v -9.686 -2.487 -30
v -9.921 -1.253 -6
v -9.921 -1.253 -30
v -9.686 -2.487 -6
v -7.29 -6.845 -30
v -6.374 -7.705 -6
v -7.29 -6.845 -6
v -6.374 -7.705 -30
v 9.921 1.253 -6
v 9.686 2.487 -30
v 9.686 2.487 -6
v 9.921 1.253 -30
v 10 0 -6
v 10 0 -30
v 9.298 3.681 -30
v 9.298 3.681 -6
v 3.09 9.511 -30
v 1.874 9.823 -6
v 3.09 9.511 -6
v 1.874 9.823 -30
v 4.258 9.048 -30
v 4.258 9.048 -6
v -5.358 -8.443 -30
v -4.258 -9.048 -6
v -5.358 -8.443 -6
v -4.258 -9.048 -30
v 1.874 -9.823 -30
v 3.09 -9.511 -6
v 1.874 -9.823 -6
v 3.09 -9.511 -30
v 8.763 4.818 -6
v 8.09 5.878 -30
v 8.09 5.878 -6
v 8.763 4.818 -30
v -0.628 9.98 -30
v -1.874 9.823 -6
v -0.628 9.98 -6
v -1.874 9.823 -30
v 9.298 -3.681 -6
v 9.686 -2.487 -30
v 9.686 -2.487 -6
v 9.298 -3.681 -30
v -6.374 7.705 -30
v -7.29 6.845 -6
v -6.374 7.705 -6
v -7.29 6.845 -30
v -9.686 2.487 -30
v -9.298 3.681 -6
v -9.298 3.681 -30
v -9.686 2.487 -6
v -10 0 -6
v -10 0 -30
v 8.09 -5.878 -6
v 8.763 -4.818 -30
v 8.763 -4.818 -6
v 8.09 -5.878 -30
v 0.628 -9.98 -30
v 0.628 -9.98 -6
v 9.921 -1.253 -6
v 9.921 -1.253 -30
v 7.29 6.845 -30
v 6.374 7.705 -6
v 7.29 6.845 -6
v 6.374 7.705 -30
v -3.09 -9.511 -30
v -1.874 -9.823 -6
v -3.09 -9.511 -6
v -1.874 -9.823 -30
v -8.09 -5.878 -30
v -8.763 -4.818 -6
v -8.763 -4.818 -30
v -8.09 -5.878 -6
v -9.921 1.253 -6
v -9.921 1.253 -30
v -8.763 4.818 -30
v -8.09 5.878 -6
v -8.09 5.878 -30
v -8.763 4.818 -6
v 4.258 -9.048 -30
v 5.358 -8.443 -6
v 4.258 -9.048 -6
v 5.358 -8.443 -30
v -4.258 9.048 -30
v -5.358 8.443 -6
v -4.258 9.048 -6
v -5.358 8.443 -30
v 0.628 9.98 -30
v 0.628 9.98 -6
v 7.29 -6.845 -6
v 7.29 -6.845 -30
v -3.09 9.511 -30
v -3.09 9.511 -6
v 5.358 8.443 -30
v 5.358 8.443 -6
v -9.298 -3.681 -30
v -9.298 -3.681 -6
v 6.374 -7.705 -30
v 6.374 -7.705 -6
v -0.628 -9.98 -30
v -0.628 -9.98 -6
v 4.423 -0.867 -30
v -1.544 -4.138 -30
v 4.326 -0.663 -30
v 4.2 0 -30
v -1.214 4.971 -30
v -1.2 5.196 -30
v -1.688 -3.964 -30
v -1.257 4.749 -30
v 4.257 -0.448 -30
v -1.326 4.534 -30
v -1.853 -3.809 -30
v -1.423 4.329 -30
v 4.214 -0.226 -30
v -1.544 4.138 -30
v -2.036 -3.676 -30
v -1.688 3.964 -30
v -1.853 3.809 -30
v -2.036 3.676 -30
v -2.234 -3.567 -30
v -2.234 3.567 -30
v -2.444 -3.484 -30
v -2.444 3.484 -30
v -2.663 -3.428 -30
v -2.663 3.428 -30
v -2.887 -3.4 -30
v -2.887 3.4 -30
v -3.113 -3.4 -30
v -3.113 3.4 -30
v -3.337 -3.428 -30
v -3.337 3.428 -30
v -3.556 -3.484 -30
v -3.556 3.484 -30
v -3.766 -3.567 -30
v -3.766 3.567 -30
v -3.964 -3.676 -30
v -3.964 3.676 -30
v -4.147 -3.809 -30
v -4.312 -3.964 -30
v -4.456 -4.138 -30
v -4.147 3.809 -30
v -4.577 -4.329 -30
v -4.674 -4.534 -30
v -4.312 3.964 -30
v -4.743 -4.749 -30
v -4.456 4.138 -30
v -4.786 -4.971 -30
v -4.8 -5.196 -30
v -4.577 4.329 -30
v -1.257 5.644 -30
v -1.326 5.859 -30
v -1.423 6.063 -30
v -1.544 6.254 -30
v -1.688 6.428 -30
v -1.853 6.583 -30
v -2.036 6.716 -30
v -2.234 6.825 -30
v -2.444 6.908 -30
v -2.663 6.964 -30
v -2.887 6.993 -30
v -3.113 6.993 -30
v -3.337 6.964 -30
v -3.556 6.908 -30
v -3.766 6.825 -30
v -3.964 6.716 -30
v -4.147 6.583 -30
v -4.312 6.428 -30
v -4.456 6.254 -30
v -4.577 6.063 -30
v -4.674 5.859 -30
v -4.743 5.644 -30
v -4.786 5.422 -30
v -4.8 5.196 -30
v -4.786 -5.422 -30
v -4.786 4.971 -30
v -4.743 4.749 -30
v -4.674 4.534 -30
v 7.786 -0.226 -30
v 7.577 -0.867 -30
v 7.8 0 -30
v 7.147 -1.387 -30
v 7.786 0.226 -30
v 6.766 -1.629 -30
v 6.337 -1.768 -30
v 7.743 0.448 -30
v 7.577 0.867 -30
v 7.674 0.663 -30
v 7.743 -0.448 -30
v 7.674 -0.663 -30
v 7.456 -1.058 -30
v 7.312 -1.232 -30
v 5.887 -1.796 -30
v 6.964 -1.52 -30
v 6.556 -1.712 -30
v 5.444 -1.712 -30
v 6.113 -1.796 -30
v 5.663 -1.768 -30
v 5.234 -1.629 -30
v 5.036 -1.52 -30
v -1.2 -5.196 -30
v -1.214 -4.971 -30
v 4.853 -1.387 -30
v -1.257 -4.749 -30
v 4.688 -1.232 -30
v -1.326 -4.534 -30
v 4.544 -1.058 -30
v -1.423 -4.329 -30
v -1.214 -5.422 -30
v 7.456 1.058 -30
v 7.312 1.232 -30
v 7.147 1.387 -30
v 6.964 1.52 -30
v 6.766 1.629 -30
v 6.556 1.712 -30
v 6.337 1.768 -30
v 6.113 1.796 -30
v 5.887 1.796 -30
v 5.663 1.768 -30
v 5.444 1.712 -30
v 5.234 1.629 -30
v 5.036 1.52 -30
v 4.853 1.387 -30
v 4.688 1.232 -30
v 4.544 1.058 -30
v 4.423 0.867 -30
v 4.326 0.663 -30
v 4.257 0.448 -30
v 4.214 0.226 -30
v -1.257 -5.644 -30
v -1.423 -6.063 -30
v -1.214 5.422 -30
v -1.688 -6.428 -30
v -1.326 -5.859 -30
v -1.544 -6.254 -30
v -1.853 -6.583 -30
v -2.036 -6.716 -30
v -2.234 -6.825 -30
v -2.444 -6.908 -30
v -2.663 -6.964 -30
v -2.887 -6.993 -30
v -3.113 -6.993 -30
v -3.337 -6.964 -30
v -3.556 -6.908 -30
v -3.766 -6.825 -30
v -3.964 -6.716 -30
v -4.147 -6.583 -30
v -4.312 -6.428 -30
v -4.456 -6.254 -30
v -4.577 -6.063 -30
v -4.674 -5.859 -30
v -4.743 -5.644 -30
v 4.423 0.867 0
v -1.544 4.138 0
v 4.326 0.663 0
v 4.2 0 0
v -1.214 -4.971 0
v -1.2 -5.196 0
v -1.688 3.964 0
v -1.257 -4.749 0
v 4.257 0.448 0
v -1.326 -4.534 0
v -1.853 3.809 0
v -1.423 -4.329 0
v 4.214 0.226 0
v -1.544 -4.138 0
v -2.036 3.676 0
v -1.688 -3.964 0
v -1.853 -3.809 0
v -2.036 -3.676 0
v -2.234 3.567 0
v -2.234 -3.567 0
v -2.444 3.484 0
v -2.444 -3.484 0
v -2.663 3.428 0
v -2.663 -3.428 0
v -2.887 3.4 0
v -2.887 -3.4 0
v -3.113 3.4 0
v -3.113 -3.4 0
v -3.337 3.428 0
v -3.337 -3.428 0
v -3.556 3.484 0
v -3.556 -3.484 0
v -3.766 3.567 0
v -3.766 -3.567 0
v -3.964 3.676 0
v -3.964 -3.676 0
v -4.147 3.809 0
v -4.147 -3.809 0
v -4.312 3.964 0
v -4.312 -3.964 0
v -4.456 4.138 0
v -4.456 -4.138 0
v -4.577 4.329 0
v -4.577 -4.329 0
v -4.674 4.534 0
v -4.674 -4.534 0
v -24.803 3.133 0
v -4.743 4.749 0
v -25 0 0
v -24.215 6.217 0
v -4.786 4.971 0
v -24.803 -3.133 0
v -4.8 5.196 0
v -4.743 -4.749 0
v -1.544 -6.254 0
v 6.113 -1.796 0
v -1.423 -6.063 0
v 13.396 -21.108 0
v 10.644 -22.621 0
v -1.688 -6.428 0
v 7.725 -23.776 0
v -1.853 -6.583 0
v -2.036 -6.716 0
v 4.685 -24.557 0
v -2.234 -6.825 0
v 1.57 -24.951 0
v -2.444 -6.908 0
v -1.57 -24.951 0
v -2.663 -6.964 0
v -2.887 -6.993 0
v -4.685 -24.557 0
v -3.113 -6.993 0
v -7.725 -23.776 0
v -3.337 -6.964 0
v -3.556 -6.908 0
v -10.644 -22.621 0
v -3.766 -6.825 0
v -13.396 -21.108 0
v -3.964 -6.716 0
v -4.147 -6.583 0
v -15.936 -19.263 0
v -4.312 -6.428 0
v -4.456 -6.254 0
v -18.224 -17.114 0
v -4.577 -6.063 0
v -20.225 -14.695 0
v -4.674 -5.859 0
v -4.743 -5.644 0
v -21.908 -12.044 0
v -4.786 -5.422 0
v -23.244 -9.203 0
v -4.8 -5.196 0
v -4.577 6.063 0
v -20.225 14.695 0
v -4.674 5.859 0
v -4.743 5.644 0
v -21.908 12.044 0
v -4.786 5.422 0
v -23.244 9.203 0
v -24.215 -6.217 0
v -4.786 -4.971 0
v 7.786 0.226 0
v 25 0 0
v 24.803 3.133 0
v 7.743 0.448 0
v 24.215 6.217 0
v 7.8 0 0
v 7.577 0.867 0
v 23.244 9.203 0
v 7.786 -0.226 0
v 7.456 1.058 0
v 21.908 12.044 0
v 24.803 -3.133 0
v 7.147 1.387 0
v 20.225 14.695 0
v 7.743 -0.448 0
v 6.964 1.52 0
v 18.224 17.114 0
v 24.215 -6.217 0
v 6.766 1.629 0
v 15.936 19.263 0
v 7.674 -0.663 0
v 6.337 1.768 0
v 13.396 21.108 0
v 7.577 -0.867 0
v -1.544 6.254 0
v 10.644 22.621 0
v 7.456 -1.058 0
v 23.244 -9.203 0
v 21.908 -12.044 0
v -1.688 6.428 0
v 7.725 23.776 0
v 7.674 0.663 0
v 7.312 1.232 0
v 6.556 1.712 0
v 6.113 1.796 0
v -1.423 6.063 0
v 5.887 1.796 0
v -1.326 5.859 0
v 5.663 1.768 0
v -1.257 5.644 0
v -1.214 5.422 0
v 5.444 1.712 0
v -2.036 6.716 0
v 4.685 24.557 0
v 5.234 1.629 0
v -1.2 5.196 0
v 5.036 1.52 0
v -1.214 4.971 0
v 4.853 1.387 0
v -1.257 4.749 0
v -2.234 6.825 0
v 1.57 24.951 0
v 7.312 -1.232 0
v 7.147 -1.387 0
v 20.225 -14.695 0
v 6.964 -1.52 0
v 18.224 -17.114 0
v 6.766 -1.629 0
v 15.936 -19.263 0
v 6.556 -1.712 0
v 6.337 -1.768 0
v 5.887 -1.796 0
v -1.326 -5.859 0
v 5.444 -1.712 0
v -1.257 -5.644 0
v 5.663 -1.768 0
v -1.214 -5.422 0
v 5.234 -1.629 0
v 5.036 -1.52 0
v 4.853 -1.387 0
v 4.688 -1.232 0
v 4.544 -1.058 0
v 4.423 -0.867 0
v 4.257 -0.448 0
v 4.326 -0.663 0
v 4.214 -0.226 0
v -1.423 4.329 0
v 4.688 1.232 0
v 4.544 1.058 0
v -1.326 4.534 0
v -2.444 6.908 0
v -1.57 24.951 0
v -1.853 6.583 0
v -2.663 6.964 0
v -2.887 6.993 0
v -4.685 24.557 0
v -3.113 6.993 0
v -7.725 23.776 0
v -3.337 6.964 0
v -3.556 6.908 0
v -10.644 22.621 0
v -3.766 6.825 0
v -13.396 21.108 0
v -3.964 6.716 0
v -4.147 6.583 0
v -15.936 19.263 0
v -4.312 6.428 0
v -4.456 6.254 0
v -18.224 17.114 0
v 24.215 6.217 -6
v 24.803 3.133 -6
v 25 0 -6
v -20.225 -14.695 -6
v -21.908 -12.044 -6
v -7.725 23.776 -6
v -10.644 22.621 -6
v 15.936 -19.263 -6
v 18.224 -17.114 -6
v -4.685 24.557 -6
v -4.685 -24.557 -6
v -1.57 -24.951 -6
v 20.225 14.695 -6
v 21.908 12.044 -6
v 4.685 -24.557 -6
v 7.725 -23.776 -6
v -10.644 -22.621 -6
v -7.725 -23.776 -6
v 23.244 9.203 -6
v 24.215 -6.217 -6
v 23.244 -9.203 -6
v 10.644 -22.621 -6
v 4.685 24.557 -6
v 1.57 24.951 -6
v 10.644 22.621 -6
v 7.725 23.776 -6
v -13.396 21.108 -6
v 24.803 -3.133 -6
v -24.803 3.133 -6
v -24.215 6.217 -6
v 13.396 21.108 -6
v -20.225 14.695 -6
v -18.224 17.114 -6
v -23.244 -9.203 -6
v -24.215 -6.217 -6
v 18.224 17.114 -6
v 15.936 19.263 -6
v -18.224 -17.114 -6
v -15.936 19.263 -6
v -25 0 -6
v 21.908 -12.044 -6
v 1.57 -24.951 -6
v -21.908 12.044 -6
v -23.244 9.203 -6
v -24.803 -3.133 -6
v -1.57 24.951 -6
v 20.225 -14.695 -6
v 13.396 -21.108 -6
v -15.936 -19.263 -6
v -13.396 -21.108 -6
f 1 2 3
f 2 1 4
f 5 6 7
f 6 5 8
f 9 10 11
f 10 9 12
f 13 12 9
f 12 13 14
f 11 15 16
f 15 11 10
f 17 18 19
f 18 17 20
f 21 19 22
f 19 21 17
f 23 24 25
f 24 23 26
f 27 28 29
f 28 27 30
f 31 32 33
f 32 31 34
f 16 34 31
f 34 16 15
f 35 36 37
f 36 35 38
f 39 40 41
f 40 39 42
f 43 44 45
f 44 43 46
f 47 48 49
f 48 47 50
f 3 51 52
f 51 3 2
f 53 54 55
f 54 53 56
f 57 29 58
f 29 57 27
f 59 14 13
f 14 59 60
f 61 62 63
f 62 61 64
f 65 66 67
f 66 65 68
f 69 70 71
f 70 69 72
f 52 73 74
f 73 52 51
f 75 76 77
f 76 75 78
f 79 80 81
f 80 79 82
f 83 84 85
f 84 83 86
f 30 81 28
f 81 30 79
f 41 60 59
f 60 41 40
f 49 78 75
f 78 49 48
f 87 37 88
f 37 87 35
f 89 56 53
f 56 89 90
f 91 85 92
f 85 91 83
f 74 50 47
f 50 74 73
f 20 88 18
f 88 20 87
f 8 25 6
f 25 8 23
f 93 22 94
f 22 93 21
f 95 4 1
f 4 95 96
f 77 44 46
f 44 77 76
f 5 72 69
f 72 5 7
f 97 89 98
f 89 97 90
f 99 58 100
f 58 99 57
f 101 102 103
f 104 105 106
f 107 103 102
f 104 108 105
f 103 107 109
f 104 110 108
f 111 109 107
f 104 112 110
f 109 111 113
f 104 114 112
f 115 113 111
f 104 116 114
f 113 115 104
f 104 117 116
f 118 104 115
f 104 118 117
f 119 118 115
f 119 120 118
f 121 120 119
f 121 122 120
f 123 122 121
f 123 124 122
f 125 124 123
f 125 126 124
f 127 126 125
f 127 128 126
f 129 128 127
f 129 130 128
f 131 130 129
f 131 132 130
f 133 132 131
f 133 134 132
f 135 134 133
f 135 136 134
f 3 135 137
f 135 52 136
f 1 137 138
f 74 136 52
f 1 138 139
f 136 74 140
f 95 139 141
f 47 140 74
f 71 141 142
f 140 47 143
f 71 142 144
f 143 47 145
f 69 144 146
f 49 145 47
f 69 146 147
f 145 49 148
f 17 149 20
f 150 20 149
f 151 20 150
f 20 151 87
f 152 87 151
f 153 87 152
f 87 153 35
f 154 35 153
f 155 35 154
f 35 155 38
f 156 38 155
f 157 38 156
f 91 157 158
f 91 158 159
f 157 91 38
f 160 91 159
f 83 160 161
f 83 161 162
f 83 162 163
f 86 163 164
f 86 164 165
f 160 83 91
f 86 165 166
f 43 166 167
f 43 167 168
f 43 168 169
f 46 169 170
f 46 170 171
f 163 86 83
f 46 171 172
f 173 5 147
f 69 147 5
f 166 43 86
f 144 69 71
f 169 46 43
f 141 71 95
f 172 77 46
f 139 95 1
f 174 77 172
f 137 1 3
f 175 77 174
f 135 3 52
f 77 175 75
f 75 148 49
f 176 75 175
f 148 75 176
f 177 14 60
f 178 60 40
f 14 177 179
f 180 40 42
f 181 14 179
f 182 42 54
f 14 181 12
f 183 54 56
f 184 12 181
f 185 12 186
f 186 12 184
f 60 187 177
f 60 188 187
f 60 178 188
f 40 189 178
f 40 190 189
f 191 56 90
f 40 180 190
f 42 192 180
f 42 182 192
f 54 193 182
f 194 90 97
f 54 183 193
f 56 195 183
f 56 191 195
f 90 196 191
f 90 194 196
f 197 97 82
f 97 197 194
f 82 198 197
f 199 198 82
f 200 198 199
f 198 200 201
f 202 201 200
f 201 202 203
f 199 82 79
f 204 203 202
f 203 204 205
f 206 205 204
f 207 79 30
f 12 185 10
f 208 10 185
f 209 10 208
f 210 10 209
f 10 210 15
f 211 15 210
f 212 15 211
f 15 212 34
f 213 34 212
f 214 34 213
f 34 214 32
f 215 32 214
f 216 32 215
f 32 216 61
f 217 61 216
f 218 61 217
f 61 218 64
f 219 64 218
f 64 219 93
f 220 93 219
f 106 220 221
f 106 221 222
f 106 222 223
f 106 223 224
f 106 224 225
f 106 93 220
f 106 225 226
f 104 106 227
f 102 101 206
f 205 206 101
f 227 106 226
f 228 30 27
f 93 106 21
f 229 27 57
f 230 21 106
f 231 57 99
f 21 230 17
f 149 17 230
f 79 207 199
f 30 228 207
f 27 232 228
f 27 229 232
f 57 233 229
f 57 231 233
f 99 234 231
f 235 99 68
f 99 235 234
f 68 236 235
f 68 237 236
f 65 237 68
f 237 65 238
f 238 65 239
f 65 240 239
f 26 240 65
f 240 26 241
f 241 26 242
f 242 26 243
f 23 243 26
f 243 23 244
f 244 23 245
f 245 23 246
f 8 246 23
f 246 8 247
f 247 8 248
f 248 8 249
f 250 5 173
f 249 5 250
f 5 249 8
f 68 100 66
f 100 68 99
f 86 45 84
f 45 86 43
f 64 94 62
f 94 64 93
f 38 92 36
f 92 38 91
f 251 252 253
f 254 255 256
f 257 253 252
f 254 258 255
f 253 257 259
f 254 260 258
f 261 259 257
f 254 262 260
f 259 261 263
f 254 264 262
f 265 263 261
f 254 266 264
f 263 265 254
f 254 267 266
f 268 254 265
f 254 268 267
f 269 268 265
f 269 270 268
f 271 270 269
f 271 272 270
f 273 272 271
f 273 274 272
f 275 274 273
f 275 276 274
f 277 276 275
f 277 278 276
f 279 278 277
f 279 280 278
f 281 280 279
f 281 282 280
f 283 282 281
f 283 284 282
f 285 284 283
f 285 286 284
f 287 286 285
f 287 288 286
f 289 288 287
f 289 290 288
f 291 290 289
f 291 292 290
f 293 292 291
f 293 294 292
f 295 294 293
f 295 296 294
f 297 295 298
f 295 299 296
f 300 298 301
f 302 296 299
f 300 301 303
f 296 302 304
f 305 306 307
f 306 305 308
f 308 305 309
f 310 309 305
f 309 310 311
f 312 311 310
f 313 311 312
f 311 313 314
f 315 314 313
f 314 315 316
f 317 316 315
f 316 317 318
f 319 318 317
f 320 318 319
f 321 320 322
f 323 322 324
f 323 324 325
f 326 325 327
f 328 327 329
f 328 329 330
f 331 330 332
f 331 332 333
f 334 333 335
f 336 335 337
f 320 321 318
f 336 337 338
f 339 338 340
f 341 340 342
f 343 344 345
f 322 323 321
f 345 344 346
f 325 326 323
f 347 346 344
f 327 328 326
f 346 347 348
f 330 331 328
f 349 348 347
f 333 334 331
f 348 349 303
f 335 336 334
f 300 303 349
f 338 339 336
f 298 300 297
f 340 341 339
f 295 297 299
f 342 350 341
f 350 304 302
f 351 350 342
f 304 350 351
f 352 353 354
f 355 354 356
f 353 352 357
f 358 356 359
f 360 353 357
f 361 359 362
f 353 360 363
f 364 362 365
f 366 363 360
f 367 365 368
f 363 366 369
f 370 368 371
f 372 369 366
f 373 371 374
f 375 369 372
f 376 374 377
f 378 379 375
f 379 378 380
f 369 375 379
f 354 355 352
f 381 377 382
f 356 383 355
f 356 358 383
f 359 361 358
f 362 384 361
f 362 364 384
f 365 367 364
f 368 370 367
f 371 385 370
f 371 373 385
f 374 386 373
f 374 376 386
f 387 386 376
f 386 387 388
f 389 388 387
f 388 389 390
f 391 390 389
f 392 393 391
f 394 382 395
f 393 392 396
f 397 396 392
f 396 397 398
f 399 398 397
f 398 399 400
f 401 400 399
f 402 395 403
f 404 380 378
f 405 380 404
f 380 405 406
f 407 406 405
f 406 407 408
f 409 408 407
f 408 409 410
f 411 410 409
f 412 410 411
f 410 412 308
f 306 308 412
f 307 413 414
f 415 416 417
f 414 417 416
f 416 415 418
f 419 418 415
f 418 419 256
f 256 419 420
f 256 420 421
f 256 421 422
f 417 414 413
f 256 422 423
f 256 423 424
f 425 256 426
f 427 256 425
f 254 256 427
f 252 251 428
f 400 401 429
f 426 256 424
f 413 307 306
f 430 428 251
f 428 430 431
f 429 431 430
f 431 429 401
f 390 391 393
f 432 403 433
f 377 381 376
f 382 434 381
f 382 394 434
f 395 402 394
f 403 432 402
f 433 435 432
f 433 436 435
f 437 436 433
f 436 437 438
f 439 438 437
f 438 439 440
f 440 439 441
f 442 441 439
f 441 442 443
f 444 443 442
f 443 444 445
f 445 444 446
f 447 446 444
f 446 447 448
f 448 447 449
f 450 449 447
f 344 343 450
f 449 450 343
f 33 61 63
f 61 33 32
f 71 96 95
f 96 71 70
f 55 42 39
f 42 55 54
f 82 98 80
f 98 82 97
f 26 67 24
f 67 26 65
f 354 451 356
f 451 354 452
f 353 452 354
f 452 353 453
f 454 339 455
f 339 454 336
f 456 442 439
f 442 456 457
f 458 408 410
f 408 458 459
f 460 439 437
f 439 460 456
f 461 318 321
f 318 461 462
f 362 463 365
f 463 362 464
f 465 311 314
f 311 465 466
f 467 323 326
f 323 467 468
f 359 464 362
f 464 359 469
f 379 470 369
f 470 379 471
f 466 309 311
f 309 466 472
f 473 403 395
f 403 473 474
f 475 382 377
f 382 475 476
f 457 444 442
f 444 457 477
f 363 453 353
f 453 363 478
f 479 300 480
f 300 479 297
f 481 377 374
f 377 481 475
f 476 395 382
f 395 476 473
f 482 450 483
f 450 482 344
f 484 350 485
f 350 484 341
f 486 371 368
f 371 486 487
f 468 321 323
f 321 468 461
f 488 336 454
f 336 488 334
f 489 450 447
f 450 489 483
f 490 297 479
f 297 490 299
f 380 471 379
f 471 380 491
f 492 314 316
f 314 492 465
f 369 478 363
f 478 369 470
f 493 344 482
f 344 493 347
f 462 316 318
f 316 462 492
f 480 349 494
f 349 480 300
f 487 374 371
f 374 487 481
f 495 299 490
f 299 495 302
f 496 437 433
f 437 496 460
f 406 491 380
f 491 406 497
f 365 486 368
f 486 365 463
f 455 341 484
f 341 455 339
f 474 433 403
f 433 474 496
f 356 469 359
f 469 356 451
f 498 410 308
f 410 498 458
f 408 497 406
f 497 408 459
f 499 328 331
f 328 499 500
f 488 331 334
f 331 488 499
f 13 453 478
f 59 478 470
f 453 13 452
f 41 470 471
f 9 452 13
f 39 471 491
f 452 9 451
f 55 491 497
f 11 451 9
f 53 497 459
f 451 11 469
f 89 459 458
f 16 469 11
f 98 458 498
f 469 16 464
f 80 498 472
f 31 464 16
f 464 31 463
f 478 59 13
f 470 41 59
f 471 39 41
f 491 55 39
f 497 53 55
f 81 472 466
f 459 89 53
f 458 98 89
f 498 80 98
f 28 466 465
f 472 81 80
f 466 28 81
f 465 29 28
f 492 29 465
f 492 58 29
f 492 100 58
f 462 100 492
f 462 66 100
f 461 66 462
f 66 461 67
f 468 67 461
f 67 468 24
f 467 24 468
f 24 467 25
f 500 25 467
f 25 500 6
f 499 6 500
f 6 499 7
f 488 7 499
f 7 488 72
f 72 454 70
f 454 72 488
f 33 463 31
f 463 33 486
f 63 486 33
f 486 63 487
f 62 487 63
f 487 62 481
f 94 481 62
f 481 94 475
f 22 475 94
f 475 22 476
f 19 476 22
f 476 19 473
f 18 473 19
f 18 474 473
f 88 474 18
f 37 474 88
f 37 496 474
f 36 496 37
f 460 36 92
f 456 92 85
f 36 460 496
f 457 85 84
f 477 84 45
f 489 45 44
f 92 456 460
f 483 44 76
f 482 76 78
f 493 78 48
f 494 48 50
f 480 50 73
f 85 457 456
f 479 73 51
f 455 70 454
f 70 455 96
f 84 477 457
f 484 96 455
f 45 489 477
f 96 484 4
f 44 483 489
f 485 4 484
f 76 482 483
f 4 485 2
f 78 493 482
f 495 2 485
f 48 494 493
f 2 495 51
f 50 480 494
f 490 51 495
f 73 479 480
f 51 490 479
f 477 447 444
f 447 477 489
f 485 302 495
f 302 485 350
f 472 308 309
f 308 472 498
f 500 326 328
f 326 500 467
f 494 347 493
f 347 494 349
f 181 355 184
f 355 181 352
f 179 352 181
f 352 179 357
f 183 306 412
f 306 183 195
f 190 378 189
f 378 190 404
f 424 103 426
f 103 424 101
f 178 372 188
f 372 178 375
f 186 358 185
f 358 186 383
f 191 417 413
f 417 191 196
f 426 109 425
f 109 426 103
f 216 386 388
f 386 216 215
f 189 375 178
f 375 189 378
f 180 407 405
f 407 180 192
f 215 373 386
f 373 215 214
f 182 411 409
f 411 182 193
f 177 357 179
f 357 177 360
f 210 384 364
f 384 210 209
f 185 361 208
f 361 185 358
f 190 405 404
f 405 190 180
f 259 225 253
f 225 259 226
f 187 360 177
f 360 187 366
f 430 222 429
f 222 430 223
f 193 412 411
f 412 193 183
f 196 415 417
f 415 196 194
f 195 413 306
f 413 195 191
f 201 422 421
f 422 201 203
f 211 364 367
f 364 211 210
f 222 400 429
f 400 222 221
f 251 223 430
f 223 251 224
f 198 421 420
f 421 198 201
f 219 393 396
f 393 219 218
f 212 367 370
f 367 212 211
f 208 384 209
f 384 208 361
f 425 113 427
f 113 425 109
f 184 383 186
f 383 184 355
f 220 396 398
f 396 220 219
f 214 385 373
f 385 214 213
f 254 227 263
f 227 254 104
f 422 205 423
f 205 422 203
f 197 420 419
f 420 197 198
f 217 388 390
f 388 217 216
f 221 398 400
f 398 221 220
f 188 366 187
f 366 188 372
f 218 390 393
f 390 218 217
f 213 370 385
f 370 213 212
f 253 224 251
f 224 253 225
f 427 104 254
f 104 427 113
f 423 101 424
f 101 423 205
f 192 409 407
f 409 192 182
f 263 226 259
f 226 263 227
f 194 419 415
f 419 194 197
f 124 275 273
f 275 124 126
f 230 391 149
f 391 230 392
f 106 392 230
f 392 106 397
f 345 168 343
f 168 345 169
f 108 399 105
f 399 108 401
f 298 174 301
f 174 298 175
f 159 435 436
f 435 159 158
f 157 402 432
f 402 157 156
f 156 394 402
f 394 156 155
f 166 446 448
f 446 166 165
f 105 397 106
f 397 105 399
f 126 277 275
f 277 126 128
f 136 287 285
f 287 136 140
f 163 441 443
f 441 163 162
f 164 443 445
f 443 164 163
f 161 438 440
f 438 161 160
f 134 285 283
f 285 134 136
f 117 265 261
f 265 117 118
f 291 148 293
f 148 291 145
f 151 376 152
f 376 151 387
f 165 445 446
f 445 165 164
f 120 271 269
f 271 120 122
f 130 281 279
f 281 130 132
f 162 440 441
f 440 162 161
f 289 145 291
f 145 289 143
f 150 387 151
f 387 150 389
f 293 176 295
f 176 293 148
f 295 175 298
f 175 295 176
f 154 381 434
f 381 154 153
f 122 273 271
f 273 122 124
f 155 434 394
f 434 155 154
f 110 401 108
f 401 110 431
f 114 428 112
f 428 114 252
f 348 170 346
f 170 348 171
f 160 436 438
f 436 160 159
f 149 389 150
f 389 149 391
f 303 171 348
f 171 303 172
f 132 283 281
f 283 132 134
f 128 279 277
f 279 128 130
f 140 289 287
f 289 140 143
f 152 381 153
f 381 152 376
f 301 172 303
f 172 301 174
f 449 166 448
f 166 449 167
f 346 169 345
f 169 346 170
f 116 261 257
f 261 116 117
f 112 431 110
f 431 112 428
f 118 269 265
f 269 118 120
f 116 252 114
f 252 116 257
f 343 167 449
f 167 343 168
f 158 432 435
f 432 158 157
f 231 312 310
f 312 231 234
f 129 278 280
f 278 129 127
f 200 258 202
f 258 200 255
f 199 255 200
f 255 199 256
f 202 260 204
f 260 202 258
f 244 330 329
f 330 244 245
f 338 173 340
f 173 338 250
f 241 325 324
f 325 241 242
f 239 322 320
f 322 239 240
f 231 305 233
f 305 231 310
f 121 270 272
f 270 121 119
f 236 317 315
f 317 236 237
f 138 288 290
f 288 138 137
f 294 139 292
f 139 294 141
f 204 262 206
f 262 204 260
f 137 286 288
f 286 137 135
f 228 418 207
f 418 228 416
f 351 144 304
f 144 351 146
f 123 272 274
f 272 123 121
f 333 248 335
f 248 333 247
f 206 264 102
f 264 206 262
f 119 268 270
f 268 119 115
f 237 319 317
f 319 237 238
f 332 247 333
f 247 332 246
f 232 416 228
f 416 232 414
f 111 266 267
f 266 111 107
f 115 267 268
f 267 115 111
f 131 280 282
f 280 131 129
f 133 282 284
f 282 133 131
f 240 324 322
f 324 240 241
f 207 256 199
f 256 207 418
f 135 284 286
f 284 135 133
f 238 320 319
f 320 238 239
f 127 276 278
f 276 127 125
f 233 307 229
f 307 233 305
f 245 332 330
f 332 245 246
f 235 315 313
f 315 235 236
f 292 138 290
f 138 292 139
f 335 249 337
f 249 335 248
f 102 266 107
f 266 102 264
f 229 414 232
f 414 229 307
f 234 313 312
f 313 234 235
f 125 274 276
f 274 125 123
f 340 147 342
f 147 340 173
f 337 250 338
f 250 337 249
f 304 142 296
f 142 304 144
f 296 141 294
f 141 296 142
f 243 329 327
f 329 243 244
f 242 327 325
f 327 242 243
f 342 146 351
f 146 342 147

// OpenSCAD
$fn = 50;


difference() {
	union() {
		translate(v = [0, 0, -30.0000000000]) {
			cylinder(h = 30, r = 10.0000000000);
		}
		translate(v = [0, 0, -6.0000000000]) {
			cylinder(h = 6, r = 25.0000000000);
		}
	}
	union() {
		#translate(v = [6.0000000000, 0.0000000000, -30]) {
			cylinder(h = 30, r = 1.8000000000);
		}
		#translate(v = [-3.0000000000, 5.1961524227, -30]) {
			cylinder(h = 30, r = 1.8000000000);
		}
		#translate(v = [-3.0000000000, -5.1961524227, -30]) {
			cylinder(h = 30, r = 1.8000000000);
		}
	}
}
